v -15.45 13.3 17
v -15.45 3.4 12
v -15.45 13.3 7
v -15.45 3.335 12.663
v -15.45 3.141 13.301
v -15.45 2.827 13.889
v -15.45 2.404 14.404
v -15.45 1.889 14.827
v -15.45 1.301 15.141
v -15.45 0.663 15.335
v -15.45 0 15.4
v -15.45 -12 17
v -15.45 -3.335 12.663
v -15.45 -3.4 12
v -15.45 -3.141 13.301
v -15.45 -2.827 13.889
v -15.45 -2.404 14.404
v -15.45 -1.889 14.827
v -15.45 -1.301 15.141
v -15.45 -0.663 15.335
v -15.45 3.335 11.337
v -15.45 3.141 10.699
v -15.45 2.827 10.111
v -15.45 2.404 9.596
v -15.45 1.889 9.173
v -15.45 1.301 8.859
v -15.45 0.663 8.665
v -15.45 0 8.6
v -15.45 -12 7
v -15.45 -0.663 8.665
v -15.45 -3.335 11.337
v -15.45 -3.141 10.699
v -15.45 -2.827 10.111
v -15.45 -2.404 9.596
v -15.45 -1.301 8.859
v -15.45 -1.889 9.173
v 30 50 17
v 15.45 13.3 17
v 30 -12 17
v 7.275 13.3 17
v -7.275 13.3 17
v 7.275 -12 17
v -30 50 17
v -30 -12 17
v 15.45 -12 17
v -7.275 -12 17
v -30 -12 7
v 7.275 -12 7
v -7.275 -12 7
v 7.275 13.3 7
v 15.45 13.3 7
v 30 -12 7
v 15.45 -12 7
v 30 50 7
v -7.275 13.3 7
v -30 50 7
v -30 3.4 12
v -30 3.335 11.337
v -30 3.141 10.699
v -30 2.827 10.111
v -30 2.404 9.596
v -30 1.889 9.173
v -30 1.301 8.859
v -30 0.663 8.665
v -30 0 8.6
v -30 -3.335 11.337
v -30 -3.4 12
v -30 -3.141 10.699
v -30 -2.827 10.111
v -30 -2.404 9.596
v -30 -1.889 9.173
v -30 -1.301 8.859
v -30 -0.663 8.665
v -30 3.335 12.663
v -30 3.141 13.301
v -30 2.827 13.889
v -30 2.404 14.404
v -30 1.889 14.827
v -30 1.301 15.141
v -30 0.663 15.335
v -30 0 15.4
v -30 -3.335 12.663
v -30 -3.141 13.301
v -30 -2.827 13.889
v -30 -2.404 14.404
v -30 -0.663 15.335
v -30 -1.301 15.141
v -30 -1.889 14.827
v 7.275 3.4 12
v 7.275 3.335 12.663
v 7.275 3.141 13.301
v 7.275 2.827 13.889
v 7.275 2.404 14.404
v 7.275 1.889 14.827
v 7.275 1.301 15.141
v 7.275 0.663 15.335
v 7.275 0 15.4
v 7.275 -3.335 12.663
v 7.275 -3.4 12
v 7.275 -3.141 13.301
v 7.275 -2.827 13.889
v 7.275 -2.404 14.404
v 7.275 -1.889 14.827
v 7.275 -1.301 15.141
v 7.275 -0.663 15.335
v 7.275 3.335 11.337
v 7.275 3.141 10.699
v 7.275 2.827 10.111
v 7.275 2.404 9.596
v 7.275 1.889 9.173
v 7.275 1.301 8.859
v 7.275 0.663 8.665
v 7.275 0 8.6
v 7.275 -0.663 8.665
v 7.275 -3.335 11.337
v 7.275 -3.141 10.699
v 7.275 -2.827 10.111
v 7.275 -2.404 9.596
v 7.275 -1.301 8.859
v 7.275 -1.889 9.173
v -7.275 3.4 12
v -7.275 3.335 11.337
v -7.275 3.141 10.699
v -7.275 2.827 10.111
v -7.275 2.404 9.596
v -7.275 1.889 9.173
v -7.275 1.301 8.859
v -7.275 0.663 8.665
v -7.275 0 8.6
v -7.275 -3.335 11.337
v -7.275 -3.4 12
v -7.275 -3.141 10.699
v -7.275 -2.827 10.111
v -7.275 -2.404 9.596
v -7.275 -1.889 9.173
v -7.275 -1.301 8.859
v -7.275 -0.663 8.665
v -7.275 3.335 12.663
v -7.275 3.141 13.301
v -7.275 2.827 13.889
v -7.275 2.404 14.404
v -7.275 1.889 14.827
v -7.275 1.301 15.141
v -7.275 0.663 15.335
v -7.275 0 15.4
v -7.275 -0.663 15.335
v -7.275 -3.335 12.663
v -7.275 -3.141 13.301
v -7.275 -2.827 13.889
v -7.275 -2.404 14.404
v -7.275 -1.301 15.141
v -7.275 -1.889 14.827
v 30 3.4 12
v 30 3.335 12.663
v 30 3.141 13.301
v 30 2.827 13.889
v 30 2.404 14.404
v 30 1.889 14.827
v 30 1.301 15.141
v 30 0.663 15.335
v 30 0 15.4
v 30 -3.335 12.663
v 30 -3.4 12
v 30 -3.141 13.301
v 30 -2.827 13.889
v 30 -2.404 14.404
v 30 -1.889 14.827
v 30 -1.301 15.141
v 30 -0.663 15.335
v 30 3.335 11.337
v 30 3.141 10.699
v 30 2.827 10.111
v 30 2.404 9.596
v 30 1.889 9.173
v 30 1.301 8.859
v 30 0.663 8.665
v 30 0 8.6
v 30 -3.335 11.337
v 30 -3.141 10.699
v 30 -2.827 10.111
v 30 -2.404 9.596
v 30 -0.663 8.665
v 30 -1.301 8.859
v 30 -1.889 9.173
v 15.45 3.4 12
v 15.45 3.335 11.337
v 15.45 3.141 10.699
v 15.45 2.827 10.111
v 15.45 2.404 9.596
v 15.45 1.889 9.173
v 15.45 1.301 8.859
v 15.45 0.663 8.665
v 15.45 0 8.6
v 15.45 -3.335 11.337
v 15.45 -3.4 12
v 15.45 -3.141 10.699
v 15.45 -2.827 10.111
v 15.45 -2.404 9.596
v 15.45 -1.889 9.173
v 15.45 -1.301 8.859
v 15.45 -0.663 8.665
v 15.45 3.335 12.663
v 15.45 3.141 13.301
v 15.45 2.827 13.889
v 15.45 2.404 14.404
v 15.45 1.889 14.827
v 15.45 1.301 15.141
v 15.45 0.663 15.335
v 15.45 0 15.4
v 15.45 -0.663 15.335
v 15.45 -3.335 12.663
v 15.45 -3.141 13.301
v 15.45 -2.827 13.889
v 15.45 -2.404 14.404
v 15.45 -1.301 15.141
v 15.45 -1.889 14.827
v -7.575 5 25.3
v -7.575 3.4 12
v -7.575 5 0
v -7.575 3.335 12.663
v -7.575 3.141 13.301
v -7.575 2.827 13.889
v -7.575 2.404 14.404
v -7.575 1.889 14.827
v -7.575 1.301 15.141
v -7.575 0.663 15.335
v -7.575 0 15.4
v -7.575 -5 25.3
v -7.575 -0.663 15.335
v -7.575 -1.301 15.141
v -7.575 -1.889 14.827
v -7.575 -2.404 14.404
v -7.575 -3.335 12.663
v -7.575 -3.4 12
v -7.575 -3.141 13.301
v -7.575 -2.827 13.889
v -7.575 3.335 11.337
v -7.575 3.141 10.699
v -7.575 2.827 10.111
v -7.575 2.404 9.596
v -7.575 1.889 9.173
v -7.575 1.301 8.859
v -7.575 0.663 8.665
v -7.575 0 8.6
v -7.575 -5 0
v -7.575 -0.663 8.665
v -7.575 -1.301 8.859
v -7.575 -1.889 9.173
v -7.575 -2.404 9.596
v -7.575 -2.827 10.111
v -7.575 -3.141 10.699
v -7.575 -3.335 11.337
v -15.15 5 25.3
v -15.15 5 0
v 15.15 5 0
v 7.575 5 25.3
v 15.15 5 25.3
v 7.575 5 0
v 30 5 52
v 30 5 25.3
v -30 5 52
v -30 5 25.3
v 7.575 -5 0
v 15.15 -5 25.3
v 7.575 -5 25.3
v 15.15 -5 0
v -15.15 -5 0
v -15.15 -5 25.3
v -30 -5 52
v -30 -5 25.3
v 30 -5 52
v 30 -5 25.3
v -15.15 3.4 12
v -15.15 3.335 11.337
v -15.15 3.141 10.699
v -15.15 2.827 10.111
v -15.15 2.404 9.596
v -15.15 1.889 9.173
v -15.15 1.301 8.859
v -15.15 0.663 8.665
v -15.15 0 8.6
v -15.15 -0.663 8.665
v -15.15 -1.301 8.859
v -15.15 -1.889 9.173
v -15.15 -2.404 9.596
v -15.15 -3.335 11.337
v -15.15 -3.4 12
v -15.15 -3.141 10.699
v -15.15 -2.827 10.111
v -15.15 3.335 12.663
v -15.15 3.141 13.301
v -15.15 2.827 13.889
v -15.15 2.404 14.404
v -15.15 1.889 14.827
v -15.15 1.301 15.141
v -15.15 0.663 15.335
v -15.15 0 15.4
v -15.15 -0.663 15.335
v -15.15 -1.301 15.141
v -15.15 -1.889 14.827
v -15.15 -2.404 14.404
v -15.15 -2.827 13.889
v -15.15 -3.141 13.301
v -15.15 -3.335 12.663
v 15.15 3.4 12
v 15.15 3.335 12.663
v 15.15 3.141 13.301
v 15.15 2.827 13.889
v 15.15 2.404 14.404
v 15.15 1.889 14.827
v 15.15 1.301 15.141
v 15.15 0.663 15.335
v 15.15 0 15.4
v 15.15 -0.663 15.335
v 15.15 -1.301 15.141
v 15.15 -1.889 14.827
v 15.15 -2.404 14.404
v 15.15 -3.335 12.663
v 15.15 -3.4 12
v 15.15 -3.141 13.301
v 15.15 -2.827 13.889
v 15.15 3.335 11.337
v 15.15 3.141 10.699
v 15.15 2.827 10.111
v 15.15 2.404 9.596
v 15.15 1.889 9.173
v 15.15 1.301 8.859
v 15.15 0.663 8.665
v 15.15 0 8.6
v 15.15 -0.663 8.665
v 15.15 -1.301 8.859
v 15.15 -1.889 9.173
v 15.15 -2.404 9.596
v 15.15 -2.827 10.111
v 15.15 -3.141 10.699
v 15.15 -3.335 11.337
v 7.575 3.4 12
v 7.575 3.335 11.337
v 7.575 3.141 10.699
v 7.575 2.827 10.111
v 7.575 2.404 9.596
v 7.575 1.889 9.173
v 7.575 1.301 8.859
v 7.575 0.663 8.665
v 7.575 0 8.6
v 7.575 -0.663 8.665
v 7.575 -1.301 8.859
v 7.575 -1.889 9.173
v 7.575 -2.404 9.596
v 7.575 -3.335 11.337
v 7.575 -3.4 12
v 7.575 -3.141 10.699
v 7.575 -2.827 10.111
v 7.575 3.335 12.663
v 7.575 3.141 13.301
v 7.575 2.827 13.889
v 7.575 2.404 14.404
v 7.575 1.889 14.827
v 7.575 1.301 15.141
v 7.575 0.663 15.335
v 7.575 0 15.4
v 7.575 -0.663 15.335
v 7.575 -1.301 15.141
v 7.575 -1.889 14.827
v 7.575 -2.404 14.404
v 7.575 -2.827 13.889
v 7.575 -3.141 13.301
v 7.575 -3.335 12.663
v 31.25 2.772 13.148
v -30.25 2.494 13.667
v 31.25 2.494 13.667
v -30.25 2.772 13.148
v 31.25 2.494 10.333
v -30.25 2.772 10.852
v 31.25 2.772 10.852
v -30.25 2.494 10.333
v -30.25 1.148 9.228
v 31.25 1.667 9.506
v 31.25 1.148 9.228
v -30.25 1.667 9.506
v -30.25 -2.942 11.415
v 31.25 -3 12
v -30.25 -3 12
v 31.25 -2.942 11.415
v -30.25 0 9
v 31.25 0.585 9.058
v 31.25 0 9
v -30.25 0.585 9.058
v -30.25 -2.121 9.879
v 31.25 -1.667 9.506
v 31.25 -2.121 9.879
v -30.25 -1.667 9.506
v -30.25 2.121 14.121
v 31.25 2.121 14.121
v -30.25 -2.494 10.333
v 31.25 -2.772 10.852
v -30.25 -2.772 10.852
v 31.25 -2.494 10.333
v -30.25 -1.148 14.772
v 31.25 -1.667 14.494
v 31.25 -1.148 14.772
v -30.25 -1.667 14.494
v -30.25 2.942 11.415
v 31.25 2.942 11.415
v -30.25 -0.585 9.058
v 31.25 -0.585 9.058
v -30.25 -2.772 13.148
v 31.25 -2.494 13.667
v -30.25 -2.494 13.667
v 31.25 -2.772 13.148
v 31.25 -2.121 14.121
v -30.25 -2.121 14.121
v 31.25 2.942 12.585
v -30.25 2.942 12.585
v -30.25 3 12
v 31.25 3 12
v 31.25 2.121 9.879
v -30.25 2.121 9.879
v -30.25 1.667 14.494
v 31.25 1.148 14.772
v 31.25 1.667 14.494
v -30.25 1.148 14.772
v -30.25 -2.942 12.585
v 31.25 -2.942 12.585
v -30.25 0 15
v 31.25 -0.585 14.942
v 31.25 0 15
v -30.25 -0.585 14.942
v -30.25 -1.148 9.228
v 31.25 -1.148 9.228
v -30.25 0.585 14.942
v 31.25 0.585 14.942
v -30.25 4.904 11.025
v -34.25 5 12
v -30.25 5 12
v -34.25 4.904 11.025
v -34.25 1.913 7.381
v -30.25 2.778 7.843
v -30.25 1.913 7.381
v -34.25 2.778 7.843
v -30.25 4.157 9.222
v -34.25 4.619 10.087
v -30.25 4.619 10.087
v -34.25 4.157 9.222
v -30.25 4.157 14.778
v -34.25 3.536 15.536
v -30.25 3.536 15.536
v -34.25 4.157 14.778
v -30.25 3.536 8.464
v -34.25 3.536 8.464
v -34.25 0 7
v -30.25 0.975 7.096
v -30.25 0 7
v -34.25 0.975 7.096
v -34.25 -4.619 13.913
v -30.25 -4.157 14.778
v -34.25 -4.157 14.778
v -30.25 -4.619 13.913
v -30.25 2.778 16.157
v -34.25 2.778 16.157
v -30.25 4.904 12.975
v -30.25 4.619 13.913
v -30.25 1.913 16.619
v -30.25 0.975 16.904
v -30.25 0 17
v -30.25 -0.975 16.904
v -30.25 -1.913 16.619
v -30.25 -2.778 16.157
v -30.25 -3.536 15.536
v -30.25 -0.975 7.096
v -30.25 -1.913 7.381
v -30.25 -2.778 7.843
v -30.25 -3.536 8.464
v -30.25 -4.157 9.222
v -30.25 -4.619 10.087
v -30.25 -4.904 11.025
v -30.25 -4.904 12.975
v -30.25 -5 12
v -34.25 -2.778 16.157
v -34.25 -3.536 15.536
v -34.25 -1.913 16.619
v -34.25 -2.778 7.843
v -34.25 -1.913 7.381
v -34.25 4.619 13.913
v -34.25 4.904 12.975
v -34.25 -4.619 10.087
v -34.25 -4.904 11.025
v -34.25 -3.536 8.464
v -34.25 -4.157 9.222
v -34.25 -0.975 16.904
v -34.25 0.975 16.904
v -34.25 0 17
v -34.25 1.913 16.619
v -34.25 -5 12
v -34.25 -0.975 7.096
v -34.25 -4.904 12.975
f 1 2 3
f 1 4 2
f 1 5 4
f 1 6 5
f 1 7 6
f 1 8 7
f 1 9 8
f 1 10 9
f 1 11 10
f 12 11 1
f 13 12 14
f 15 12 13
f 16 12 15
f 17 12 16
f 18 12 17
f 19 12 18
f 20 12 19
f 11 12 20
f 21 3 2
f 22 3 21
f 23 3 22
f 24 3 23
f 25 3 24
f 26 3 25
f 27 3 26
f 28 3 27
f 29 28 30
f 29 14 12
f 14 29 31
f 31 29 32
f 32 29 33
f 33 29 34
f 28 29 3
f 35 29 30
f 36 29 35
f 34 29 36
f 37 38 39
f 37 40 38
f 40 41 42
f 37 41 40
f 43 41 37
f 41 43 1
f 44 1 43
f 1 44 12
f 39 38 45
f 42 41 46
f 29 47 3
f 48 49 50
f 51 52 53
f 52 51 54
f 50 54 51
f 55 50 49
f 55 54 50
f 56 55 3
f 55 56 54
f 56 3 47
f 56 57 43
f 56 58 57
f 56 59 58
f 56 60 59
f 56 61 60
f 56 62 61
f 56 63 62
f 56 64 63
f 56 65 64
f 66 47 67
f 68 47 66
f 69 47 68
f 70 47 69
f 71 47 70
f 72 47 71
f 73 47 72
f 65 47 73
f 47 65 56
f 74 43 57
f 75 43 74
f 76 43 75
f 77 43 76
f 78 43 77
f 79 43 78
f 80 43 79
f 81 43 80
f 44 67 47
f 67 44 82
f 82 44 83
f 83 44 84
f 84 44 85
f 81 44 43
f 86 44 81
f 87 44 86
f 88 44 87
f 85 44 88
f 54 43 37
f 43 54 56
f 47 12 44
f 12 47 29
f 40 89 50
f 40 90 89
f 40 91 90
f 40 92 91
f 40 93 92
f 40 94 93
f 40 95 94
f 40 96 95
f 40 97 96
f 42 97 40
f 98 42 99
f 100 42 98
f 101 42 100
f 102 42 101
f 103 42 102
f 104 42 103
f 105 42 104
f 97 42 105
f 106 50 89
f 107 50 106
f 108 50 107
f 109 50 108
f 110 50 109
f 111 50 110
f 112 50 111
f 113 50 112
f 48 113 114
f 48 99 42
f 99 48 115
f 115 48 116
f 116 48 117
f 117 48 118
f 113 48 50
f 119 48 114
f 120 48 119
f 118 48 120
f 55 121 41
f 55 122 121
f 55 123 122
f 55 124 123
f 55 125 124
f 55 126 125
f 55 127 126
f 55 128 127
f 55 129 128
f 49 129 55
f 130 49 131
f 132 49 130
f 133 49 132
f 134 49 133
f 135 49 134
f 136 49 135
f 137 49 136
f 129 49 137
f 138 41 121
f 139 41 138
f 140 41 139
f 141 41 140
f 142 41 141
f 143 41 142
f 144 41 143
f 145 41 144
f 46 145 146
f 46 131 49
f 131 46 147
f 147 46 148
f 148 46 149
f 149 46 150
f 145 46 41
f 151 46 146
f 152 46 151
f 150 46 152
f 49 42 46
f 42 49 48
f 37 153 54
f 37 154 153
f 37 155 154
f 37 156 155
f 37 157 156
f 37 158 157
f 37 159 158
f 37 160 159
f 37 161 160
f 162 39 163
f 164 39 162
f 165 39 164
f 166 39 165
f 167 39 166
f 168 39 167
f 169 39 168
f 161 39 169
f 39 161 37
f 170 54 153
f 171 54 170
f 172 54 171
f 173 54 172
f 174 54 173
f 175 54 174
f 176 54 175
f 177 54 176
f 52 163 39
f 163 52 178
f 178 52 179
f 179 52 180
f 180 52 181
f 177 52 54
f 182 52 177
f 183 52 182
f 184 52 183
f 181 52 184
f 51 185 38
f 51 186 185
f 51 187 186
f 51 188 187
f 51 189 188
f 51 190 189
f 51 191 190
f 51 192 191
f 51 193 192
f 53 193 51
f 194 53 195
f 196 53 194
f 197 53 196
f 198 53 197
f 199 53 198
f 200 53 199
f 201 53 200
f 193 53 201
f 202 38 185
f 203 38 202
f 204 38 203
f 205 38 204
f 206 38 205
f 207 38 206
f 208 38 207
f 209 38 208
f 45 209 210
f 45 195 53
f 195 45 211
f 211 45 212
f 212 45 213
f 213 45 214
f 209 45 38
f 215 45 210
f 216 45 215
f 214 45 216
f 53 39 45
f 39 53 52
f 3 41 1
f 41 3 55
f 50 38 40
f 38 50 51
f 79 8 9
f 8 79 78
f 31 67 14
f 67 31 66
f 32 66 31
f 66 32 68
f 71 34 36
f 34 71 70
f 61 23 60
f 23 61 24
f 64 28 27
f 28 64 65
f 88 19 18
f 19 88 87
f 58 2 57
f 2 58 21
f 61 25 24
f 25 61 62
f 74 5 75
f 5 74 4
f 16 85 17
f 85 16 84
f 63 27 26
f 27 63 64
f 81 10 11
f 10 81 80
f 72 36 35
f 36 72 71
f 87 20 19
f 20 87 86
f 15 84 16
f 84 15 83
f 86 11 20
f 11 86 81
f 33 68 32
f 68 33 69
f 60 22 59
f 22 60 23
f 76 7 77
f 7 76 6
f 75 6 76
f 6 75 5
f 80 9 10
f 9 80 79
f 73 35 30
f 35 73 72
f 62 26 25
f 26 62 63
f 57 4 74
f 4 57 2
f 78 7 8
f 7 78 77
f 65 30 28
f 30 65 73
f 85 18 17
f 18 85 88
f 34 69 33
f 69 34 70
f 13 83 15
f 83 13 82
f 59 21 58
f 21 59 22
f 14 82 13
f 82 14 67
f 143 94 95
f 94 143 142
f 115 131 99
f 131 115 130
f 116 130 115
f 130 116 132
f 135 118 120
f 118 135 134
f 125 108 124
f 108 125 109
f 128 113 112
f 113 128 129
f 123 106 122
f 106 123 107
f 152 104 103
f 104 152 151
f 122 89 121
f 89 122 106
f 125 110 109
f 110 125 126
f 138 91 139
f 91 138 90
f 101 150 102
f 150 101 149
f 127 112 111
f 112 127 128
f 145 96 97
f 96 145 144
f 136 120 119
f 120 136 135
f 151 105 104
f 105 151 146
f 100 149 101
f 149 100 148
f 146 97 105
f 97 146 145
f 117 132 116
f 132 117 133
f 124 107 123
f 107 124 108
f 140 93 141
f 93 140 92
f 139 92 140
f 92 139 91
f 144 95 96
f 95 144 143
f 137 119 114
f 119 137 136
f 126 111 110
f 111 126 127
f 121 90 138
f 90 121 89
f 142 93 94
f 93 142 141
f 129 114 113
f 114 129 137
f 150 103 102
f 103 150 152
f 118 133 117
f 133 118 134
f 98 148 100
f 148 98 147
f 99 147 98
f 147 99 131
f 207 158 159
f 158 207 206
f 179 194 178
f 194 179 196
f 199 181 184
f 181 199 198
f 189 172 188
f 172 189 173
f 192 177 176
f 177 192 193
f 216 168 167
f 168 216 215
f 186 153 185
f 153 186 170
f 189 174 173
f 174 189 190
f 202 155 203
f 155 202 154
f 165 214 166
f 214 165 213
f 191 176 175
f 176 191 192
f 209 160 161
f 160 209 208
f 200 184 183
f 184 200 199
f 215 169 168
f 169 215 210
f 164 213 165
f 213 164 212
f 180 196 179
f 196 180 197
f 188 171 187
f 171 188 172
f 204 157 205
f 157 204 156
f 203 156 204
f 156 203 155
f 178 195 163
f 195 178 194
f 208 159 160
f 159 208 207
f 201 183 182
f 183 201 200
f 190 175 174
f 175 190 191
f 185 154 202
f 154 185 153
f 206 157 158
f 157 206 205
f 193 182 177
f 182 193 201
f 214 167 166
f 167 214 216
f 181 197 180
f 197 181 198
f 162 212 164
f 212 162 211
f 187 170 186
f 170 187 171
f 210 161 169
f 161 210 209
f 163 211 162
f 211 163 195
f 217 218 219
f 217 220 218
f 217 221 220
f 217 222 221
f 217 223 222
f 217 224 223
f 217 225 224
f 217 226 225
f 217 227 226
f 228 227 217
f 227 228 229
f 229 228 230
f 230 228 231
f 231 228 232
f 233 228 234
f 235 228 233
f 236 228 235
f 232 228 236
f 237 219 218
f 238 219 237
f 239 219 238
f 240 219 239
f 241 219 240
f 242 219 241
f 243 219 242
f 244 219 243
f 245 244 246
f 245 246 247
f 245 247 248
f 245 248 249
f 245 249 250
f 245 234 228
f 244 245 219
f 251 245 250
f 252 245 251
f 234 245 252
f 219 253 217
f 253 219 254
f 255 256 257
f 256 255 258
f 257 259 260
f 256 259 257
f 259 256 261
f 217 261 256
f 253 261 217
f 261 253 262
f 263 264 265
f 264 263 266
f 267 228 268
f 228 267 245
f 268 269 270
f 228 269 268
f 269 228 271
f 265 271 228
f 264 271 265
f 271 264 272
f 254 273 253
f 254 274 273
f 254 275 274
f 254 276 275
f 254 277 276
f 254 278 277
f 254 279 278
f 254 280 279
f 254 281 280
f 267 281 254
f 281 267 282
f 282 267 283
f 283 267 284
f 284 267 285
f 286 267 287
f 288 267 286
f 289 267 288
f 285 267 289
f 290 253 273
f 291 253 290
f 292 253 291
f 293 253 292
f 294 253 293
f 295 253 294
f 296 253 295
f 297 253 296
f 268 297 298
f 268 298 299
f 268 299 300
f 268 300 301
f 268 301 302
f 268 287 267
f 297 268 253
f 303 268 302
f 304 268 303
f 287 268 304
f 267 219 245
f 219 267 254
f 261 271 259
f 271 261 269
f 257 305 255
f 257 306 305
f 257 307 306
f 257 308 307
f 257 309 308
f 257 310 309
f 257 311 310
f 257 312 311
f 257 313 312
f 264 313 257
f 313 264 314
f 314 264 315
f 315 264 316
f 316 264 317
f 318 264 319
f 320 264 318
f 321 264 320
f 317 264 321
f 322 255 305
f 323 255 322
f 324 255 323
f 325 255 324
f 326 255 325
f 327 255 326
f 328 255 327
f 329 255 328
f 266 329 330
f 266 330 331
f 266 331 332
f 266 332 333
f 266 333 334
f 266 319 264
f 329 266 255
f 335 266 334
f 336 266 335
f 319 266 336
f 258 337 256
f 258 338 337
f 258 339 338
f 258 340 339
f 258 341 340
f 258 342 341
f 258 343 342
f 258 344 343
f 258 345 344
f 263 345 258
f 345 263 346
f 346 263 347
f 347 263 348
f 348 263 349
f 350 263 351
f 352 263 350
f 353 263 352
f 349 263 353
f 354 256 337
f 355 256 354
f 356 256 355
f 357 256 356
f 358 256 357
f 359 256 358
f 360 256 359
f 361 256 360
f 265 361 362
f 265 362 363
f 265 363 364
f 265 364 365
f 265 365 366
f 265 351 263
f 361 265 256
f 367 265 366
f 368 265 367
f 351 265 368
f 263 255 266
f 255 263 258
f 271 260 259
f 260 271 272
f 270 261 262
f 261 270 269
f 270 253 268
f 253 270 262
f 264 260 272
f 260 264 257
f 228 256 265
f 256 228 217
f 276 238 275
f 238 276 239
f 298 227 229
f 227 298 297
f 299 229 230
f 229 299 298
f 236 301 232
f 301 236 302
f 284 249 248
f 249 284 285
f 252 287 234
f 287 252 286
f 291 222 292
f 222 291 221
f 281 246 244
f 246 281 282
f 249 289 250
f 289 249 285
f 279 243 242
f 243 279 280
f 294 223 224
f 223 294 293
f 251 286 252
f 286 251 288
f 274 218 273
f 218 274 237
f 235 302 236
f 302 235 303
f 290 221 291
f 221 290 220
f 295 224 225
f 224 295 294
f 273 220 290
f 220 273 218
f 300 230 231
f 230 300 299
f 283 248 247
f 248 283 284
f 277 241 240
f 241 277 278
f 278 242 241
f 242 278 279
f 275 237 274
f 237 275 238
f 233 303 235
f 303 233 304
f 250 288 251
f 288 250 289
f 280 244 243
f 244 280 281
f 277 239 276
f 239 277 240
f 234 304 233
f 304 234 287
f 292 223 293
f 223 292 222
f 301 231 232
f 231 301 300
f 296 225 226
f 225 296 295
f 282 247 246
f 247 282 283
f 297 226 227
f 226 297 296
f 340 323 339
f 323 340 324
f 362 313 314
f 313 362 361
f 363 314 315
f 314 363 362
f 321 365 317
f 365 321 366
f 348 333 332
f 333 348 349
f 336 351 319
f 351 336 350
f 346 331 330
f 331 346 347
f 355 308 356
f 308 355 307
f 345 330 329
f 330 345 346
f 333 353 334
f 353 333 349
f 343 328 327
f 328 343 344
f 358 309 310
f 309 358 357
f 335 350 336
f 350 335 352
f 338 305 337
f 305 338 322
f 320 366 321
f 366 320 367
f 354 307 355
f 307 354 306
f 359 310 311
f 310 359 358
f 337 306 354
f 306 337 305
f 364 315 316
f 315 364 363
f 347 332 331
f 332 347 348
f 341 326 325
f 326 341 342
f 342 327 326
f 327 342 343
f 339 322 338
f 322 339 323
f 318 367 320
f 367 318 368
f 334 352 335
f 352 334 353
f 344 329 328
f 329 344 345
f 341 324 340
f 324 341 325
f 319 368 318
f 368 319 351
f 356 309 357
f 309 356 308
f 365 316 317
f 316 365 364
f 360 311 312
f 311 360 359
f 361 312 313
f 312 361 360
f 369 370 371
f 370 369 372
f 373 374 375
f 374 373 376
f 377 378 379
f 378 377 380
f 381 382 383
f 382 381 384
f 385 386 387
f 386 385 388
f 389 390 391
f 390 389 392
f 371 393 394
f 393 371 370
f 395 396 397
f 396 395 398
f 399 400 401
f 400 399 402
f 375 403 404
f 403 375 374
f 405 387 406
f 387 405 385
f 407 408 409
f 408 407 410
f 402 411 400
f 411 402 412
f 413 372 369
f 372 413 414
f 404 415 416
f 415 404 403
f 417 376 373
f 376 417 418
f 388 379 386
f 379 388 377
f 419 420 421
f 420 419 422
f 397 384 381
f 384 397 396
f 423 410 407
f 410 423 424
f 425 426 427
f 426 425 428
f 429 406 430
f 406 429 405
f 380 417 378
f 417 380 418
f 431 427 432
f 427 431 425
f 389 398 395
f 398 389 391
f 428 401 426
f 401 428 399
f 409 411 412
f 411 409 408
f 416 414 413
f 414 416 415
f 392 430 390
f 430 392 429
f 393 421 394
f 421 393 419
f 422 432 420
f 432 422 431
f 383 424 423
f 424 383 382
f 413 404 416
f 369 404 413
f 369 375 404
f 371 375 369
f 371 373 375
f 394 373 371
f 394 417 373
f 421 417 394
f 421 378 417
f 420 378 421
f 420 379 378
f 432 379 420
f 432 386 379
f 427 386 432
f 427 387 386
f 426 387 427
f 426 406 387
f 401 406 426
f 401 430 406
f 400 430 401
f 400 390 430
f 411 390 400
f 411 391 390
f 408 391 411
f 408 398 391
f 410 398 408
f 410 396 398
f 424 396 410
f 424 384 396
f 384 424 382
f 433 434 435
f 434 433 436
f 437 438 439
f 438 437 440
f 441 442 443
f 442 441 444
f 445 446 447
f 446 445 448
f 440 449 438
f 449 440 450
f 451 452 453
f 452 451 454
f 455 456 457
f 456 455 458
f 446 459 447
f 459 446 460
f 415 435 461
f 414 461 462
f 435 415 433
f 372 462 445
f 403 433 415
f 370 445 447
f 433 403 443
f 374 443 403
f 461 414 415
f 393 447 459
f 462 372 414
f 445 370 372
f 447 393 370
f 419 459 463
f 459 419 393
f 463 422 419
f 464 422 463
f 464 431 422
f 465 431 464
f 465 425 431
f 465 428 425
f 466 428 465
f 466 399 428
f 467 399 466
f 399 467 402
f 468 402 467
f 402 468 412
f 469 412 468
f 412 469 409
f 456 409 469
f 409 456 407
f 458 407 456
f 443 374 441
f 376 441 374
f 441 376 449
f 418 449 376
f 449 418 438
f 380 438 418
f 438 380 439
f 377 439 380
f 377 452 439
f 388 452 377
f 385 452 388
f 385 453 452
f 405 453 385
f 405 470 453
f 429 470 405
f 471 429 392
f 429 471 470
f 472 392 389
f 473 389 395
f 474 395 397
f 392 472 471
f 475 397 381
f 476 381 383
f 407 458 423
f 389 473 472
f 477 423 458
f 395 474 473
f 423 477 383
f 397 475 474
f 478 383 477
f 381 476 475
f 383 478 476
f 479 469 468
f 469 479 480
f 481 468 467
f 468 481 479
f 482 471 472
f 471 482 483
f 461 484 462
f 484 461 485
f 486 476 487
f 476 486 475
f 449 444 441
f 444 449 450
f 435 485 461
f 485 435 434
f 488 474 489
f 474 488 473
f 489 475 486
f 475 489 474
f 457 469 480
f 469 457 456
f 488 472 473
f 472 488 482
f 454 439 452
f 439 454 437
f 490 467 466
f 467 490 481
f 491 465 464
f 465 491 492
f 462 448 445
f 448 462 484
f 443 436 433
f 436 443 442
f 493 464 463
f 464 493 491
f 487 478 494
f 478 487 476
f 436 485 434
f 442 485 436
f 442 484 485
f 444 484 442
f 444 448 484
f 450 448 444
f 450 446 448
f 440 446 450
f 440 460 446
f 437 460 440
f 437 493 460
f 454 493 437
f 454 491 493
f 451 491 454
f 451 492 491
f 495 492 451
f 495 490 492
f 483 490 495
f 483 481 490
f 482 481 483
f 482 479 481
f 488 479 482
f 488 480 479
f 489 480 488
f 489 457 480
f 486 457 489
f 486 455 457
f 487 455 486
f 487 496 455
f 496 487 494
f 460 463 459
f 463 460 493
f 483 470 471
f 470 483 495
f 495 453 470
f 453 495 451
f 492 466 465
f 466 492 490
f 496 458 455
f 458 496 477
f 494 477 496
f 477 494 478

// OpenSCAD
$fn = 32;

// ------------------------------------------------------------------------
// Butt hinge: hinge 60 mm, leaf swung 270 deg
// Every part is its own module, assembly() places every instance.
// ------------------------------------------------------------------------

// --- part 1 ---
module hinge_base() {
  difference() {
    union() {
      translate([-30, -12, -5]) cube([14.55, 62, 10]);
      translate([-7.275, -12, -5]) cube([14.55, 62, 10]);
      translate([15.45, -12, -5]) cube([14.55, 62, 10]);
      translate([-30, 13.3, -5]) cube([60, 36.7, 10]);
    }
    translate([-22.725, 0, 0]) rotate([0, 90, 0]) cylinder(h = 16.55, d = 6.8, center = true);
    translate([0, 0, 0]) rotate([0, 90, 0]) cylinder(h = 16.55, d = 6.8, center = true);
    translate([22.725, 0, 0]) rotate([0, 90, 0]) cylinder(h = 16.55, d = 6.8, center = true);
  }
}

// --- part 2 ---
module hinge_mover() {
  difference() {
    union() {
      translate([-15.15, -40, -5]) cube([7.575, 52, 10]);
      translate([7.575, -40, -5]) cube([7.575, 52, 10]);
      translate([-30, -40, -5]) cube([60, 26.7, 10]);
    }
    translate([-11.362, 0, 0]) rotate([0, 90, 0]) cylinder(h = 9.575, d = 6.8, center = true);
    translate([11.362, 0, 0]) rotate([0, 90, 0]) cylinder(h = 9.575, d = 6.8, center = true);
  }
}

// --- part 3 ---
module hinge_pin() {
  rotate([0, 90, 0]) cylinder(h = 62.5, d = 6, center = true);
  translate([-34.25, 0, 0]) rotate([0, 90, 0]) cylinder(h = 4, d = 10);
}

// --- assembly ---
module assembly() {
  color([0.80, 0.24, 0.20]) translate([0, 0, 12]) rotate([0, 0, 0]) hinge_base();
  color([0.20, 0.45, 0.75]) translate([0, 0, 12]) rotate([270, 0, 0]) hinge_mover();
  color([0.25, 0.62, 0.32]) translate([0, 0, 12]) rotate([0, 0, 0]) hinge_pin();
}

assembly();
